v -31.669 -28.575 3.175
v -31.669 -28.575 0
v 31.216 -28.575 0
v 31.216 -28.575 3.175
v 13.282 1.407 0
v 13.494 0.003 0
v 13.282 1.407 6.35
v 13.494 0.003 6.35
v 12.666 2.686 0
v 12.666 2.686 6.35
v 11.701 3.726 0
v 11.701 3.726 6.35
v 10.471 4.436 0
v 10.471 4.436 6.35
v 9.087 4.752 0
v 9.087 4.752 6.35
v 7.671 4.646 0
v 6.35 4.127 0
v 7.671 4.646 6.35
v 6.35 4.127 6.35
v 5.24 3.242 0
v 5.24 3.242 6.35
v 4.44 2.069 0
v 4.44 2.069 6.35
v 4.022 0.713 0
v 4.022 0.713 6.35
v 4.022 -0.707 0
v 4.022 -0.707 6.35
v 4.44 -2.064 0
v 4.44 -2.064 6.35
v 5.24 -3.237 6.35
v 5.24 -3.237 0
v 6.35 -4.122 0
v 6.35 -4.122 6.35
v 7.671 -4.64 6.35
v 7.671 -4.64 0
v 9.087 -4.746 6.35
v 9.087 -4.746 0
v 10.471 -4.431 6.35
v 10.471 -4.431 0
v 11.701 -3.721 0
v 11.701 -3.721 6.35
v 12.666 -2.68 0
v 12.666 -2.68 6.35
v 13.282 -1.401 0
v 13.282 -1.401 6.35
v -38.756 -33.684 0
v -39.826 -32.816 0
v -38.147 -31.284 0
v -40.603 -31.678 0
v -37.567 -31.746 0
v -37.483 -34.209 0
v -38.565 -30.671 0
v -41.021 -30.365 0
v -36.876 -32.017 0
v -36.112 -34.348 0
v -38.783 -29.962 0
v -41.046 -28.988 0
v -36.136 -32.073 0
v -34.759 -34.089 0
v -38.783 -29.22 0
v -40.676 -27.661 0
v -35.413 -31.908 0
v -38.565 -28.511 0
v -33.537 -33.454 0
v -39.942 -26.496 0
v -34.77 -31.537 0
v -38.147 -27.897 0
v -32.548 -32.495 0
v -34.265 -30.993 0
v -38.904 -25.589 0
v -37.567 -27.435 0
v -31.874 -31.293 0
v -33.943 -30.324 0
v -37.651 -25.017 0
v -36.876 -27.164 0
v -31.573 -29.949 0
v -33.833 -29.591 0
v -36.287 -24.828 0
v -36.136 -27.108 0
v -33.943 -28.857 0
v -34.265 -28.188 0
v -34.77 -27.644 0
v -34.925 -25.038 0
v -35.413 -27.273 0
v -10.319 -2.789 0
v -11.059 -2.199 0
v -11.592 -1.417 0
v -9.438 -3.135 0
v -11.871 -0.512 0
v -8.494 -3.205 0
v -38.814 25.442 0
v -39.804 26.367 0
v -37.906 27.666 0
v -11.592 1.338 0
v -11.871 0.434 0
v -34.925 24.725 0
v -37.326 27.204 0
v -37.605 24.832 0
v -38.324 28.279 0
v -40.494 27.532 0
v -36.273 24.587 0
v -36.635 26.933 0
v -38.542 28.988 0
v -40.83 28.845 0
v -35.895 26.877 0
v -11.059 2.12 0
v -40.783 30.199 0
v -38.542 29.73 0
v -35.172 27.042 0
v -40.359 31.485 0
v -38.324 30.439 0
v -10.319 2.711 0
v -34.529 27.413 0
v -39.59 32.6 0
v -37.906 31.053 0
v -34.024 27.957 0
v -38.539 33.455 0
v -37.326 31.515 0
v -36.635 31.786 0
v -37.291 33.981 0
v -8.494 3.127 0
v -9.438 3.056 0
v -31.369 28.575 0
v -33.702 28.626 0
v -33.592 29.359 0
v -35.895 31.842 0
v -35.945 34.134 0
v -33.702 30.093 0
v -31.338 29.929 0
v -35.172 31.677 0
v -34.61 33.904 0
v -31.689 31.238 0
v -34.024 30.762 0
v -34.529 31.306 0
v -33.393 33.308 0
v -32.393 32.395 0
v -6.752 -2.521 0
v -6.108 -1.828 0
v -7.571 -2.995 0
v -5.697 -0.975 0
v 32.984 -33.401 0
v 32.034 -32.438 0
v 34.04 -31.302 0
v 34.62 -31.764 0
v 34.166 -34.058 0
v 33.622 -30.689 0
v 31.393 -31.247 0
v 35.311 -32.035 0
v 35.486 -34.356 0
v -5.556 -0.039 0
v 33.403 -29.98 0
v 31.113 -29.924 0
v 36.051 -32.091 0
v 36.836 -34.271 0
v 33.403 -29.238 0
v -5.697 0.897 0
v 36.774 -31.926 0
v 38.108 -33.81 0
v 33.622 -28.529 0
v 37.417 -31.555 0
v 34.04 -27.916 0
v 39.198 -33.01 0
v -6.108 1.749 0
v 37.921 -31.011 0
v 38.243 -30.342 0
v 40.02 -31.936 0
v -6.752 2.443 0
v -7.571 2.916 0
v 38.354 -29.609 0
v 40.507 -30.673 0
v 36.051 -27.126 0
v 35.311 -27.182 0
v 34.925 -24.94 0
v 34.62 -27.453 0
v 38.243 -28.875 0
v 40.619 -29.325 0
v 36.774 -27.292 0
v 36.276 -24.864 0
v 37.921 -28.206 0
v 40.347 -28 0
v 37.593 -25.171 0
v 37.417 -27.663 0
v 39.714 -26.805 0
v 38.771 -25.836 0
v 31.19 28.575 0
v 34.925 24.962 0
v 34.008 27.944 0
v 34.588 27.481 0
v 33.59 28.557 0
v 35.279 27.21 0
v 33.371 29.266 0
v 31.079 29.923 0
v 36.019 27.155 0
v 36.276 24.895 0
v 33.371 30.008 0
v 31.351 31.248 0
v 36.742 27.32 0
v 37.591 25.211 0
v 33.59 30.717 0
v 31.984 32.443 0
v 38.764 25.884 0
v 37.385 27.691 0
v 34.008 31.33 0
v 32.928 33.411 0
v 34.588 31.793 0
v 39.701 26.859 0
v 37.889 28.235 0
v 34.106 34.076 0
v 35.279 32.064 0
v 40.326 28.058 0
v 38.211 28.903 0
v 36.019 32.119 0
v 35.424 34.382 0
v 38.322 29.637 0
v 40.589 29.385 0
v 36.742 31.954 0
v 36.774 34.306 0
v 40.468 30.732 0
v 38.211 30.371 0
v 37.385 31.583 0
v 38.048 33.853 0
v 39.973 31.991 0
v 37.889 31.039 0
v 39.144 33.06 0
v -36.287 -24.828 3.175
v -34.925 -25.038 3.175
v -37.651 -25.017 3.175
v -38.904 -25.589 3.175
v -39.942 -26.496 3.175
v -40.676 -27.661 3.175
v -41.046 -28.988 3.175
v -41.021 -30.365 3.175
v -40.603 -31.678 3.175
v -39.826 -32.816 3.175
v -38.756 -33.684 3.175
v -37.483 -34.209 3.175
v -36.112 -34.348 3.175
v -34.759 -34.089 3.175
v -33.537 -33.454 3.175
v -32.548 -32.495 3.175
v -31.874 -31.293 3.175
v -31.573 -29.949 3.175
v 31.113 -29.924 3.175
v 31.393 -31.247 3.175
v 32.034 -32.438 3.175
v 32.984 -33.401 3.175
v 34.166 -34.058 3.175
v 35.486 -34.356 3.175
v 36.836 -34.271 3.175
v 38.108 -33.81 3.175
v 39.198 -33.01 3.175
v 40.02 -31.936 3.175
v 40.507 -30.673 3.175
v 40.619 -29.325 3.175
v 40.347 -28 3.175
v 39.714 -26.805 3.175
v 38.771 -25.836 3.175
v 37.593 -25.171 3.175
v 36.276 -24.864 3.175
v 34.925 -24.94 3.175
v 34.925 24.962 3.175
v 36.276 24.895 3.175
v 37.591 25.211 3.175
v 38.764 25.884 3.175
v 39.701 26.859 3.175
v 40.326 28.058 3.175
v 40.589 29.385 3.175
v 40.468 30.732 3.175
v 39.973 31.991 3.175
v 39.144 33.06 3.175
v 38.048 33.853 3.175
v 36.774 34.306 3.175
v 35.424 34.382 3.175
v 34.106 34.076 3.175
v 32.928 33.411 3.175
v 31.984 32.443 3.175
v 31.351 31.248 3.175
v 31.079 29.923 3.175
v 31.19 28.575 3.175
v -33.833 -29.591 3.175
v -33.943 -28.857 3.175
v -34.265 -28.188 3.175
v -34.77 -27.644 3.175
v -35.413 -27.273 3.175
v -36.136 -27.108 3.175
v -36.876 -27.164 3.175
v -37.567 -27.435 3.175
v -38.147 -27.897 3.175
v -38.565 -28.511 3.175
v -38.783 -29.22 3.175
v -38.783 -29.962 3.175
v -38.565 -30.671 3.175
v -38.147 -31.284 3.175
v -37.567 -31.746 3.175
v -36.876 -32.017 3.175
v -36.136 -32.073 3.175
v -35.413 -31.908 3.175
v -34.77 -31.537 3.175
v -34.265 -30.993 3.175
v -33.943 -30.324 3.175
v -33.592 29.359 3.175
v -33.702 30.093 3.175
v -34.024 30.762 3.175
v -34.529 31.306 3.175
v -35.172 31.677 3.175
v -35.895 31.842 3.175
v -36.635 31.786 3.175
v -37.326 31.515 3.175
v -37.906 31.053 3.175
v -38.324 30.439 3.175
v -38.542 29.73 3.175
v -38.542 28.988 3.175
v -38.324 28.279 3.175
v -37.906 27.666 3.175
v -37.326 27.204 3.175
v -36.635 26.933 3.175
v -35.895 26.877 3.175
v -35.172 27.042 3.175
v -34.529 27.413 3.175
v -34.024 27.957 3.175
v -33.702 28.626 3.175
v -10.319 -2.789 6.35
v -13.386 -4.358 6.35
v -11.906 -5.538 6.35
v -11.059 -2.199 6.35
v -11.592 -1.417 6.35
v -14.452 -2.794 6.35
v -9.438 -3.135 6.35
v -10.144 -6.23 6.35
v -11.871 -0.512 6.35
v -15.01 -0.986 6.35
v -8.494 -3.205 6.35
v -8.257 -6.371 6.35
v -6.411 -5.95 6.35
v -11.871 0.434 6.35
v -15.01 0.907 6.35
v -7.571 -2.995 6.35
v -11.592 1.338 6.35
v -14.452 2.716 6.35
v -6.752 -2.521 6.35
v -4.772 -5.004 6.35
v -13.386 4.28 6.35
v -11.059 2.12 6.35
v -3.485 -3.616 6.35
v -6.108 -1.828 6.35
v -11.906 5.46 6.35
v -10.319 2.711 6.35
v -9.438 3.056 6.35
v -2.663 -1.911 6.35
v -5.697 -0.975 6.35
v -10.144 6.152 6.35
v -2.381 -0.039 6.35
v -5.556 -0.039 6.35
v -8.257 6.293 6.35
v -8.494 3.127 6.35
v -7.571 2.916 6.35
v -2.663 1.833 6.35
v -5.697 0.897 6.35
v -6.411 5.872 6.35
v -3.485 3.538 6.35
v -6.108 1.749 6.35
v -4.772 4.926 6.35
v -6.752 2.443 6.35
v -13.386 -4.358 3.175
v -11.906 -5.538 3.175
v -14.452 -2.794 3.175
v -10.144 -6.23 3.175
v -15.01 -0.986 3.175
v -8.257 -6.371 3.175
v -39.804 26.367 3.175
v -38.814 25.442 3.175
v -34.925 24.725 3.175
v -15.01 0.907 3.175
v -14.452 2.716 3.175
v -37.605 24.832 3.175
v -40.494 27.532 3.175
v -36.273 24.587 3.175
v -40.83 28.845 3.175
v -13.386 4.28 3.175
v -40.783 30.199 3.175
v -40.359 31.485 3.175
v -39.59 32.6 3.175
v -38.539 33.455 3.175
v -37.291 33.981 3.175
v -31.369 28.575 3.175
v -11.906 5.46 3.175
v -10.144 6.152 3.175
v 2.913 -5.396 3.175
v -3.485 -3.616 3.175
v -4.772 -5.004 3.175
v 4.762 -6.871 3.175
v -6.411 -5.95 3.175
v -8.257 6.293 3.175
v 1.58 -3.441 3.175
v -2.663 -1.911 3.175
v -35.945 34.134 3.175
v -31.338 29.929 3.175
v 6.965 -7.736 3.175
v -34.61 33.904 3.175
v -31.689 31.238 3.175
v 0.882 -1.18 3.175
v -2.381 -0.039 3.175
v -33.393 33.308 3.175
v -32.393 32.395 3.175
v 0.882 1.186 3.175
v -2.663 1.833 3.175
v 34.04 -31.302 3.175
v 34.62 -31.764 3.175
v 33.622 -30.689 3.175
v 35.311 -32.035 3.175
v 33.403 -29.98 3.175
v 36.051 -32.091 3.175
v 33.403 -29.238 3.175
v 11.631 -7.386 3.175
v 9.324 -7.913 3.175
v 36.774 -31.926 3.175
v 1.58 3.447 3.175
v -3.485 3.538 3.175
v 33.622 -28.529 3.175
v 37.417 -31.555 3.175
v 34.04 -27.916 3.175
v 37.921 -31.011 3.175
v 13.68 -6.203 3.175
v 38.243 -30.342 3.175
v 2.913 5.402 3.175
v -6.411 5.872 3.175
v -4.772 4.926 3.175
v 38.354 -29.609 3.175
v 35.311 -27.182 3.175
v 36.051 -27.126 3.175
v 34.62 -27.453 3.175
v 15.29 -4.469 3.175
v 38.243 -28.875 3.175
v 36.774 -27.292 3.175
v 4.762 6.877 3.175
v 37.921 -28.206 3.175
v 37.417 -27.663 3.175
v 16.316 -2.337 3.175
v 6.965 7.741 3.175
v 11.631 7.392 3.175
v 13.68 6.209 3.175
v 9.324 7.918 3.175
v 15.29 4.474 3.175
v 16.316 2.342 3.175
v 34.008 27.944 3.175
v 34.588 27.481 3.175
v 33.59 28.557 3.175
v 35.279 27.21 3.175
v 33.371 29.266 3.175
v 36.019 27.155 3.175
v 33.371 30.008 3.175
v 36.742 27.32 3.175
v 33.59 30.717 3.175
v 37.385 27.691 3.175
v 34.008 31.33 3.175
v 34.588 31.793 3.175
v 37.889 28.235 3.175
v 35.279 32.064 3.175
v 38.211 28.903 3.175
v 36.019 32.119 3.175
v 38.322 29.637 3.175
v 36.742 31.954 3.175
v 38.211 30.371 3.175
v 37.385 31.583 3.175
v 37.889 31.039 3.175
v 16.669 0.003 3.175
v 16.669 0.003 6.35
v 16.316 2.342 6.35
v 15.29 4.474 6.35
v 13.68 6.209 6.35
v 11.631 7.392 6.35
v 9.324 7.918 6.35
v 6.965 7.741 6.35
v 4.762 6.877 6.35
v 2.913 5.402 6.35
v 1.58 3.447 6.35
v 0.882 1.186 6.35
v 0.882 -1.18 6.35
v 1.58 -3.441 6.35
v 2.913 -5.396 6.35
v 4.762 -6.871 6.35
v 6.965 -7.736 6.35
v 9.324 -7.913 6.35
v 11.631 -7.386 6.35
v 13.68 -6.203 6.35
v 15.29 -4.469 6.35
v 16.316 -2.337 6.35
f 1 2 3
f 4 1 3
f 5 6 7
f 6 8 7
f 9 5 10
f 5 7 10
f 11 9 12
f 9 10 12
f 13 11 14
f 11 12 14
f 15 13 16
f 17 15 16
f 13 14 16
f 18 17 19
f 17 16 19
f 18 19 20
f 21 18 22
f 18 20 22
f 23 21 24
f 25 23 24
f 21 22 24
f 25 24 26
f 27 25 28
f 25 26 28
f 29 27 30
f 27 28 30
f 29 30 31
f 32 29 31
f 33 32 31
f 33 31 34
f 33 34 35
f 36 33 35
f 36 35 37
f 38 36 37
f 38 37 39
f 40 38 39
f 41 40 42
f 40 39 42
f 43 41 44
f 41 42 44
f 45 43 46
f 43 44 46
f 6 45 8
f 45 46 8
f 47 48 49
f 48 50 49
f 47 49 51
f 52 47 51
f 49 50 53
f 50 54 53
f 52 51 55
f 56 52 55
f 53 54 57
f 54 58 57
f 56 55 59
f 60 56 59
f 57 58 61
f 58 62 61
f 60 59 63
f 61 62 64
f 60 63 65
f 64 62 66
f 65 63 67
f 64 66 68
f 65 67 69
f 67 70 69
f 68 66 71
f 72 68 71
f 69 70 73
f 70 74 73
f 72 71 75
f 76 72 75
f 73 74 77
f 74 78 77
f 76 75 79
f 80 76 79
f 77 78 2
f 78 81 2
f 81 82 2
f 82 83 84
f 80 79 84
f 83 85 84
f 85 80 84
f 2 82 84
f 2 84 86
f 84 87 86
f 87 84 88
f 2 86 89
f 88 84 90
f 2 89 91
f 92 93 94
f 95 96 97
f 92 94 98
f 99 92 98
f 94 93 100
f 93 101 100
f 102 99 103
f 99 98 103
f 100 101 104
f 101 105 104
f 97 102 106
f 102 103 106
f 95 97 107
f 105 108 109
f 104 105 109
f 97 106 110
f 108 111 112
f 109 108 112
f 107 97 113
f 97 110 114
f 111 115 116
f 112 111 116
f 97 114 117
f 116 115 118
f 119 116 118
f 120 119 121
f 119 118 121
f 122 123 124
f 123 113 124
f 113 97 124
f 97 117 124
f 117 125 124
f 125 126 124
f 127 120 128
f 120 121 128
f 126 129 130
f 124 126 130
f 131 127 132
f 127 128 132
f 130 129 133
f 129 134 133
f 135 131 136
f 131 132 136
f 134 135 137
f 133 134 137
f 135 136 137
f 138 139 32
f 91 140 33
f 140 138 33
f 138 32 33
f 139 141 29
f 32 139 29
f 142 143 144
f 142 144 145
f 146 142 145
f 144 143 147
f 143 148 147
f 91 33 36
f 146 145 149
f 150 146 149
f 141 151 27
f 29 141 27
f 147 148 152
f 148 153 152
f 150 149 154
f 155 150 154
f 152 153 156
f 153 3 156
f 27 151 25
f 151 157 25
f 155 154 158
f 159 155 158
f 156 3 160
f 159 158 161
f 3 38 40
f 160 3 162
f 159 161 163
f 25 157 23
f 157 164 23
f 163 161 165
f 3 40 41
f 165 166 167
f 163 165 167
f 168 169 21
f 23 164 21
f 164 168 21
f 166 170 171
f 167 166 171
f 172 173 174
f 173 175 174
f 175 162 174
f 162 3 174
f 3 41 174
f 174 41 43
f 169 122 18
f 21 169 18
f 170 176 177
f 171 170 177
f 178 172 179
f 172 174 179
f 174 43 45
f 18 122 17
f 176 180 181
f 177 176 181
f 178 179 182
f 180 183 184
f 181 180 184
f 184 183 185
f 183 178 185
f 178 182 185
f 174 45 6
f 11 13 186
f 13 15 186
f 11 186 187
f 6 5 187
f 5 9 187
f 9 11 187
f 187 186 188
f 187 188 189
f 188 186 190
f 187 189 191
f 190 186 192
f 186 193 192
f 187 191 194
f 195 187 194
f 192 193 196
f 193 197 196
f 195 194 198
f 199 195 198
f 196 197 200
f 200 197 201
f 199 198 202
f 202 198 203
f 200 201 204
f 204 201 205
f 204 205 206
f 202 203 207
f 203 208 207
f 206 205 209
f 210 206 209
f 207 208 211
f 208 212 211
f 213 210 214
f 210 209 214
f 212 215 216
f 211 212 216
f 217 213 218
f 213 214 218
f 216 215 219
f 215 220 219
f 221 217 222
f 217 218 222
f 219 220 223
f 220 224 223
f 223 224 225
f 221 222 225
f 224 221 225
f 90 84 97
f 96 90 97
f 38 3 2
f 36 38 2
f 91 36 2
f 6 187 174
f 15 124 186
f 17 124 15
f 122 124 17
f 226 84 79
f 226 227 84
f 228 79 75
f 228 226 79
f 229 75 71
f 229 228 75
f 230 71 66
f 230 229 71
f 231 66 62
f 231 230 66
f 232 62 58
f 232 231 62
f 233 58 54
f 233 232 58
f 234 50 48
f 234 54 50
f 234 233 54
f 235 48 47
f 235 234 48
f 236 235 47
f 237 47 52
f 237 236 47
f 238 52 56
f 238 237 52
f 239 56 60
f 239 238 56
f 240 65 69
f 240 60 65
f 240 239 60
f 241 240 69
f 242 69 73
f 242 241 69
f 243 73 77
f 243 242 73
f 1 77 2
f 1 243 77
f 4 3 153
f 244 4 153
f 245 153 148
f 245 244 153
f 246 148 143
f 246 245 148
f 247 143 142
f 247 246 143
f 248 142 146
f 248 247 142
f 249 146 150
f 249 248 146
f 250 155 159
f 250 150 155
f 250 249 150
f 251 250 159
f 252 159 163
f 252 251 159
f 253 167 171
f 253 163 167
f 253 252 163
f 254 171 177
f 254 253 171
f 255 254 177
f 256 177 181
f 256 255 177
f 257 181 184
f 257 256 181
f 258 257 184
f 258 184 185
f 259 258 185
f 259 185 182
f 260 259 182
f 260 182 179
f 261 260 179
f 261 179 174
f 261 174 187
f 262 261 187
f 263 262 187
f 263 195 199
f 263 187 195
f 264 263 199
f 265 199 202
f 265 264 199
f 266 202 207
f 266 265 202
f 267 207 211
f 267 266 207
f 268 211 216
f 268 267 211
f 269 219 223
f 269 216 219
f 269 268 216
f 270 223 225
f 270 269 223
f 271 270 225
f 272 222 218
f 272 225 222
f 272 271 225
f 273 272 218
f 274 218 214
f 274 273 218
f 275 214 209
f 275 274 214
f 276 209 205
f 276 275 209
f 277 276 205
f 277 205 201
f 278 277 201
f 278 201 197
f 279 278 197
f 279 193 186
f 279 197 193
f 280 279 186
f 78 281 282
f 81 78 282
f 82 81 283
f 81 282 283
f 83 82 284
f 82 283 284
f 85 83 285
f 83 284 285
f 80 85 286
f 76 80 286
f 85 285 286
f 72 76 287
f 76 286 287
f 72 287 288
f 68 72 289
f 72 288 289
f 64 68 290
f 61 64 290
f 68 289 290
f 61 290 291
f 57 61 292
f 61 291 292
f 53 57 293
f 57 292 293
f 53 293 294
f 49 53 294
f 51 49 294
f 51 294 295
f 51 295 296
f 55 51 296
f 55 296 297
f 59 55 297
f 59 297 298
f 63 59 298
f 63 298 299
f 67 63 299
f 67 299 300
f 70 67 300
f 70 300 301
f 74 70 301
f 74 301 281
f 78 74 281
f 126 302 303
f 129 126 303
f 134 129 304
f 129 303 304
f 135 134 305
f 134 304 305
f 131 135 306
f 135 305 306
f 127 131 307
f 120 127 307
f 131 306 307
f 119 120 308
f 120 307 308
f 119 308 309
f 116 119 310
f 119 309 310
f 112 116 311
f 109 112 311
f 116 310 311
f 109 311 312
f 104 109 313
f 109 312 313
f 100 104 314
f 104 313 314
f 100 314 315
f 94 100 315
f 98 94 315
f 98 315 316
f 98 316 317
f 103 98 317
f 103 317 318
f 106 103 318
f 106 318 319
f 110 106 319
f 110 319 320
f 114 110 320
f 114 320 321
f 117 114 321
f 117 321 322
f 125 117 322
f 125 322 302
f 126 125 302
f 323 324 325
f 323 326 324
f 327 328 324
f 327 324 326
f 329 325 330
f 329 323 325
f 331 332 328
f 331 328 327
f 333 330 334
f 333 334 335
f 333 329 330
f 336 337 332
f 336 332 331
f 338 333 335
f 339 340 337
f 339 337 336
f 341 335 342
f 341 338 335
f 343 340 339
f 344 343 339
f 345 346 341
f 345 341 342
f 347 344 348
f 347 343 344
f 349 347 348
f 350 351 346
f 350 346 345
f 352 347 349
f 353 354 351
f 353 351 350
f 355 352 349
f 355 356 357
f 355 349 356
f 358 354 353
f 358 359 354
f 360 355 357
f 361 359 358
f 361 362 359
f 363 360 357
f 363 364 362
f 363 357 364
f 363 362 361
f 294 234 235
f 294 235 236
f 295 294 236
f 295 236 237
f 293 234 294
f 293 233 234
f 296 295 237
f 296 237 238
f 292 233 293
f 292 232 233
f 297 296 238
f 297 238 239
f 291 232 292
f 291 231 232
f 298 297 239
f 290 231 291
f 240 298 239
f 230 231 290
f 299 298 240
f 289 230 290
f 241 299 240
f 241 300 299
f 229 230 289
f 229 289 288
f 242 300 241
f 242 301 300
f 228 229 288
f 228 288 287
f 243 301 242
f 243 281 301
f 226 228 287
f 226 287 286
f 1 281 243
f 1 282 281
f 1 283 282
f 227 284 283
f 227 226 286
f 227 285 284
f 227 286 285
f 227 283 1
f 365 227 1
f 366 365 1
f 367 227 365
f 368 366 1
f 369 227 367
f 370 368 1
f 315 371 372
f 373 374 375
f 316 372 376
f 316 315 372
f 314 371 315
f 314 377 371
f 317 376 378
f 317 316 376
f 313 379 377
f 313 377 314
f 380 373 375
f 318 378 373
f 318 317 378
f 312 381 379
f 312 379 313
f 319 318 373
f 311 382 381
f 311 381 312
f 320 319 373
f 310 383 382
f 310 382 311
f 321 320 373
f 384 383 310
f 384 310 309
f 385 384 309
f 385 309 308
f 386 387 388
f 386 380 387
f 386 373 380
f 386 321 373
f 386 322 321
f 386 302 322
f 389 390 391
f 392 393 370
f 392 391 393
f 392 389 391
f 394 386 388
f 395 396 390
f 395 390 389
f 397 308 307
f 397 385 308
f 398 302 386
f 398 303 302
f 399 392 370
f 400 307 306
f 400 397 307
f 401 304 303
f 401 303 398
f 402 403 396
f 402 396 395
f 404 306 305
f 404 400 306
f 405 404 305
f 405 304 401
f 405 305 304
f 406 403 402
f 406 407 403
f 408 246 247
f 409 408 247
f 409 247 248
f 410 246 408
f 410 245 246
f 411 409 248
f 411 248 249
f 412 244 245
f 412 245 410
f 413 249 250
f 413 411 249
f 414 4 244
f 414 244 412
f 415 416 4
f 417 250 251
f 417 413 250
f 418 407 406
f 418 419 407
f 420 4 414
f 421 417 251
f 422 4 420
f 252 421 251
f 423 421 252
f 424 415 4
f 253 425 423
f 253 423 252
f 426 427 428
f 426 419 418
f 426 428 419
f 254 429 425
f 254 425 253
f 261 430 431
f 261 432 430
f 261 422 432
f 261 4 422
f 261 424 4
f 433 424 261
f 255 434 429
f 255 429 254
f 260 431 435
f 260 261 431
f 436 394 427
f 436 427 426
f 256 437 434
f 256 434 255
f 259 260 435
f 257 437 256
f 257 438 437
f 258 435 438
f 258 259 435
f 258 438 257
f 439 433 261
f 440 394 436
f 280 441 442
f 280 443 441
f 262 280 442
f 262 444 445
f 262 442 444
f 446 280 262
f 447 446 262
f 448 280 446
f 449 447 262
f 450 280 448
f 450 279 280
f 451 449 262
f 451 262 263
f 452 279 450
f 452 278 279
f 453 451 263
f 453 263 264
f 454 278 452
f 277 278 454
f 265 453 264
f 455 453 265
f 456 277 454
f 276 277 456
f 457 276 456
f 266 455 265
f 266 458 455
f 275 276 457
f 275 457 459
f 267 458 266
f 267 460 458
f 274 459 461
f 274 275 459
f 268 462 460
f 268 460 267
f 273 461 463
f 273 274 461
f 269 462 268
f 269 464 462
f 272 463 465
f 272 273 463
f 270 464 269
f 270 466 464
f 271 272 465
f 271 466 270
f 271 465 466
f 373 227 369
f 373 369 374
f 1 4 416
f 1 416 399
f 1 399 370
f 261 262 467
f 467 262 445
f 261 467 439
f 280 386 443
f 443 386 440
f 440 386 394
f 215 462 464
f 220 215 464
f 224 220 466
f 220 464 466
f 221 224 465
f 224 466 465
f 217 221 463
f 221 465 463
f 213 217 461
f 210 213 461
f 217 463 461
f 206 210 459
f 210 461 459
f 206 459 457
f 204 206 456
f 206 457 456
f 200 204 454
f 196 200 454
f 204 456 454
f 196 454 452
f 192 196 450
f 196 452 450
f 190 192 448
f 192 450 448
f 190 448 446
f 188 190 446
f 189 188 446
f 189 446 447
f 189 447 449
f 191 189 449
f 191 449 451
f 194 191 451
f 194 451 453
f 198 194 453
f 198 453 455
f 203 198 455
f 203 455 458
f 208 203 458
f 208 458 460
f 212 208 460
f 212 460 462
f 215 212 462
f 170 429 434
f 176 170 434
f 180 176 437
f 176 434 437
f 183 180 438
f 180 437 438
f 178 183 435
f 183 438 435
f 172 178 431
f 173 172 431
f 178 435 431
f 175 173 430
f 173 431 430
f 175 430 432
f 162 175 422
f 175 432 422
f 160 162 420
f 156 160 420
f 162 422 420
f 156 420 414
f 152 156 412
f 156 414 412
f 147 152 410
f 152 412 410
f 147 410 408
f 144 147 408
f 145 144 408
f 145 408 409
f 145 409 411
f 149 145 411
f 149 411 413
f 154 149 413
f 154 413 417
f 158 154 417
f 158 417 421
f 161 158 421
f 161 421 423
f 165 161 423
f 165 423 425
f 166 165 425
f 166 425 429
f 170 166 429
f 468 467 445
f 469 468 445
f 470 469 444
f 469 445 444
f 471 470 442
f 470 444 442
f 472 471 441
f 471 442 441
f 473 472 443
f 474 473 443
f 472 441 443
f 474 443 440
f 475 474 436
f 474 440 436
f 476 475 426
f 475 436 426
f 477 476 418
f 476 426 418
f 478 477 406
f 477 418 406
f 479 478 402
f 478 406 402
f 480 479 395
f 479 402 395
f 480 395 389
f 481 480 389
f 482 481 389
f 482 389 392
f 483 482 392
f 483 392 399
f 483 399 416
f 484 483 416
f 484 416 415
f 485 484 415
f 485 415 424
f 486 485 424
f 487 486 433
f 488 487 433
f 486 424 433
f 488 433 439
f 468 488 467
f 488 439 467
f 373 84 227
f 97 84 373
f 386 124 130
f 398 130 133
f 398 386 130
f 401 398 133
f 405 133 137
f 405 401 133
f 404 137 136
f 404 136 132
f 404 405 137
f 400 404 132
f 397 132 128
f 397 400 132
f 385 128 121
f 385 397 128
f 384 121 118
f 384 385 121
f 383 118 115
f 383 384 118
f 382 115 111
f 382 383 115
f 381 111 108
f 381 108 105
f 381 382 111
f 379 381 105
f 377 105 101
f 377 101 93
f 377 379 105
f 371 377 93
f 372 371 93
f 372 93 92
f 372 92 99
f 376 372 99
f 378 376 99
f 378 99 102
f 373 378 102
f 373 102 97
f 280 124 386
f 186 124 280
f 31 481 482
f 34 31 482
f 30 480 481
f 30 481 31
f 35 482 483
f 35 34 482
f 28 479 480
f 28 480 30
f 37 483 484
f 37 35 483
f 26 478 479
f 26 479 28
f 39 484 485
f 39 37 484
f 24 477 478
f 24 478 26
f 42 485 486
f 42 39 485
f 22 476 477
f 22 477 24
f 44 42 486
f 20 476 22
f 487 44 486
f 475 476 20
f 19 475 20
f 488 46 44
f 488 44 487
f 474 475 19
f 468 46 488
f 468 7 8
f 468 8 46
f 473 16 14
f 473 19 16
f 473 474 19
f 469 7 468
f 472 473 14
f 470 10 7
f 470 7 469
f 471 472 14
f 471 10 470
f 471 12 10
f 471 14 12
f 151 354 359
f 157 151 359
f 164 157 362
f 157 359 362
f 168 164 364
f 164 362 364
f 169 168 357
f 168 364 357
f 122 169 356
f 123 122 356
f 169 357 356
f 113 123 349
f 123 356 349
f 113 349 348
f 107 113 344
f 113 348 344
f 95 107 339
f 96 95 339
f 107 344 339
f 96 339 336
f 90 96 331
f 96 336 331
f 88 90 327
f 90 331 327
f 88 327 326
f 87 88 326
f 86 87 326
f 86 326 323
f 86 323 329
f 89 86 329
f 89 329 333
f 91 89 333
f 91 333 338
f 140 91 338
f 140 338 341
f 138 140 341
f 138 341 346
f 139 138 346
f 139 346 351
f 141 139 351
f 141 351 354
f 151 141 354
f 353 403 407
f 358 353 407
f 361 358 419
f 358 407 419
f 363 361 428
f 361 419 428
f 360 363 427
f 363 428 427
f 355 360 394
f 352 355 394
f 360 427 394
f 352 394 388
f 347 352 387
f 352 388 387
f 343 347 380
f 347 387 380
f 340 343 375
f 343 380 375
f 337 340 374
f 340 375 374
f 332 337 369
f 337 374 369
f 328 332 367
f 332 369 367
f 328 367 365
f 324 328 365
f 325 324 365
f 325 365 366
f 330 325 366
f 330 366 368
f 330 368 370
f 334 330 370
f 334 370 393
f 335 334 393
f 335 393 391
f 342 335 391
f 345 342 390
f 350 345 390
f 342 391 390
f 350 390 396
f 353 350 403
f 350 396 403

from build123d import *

# Parameters (mm, degrees)
SKETCH1_W           = 69.85
SKETCH1_H           = 57.15
BOSS_EXTRUDE1_DEPTH = 3.175
SKETCH2_R           = 4.776740808
SKETCH2_R_2         = 4.7625
BOSS_EXTRUDE2_DEPTH = 3.175
SKETCH3_R           = 2.4892
CUT_EXTRUDE1_DEPTH  = 54.678109207
SKETCH4_R           = 3.175
SKETCH4_R_2         = 4.7625
CUT_EXTRUDE2_DEPTH  = 54.678109207
SKETCH5_R           = 6.35
SKETCH5_R_2         = 7.9375
BOSS_EXTRUDE3_DEPTH = 3.175
SKETCH6_R           = 4.7625
SKETCH6_R_2         = 3.175
CUT_EXTRUDE3_DEPTH  = 54.959070443


with BuildPart() as part:
    # Sketch1 → Boss-Extrude1 (new body)
    with BuildSketch(Plane.XY):
        Rectangle(SKETCH1_W, SKETCH1_H)
    extrude(amount=BOSS_EXTRUDE1_DEPTH)

    # Sketch2 → Boss-Extrude2 (add)
    with BuildSketch(Plane.XY.offset(3.175)):
        with Locations((-36.080944449, 29.359475258)):
            Circle(SKETCH2_R)
        with Locations((35.832665303, 29.636957013)):
            Circle(SKETCH2_R_2)
        with Locations((35.864779118, -29.608646076)):
            Circle(SKETCH2_R_2)
        with Locations((-36.322, -29.590559194)):
            Circle(SKETCH2_R_2)
    extrude(amount=-BOSS_EXTRUDE2_DEPTH)

    # Sketch3 → Cut-Extrude1 (cut, through all)
    with BuildSketch(Plane.XY.offset(3.175)):
        with Locations((-36.080944449, 29.359475258)):
            Circle(SKETCH3_R)
        with Locations((35.832665303, 29.636957013)):
            Circle(SKETCH3_R)
        with Locations((35.864779118, -29.608646076)):
            Circle(SKETCH3_R)
        with Locations((-36.322, -29.590559194)):
            Circle(SKETCH3_R)
    extrude(amount=-CUT_EXTRUDE1_DEPTH, mode=Mode.SUBTRACT)

    # Sketch4 → Cut-Extrude2 (cut, through all)
    with BuildSketch(Plane.XY.offset(3.175)):
        with Locations((-8.73125, -0.039106259)):
            Circle(SKETCH4_R)
        with Locations((8.73125, 0.002745202)):
            Circle(SKETCH4_R_2)
    extrude(amount=-CUT_EXTRUDE2_DEPTH, mode=Mode.SUBTRACT)

    # Sketch5 → Boss-Extrude3 (add)
    with BuildSketch(Plane.XY.offset(3.175)):
        with Locations((-8.73125, -0.039106259)):
            Circle(SKETCH5_R)
        with Locations((8.73125, 0.002745202)):
            Circle(SKETCH5_R_2)
    extrude(amount=BOSS_EXTRUDE3_DEPTH)

    # Sketch6 → Cut-Extrude3 (cut, through all)
    with BuildSketch(Plane.XY.offset(6.35)):
        with Locations((8.73125, 0.002745202)):
            Circle(SKETCH6_R)
        with Locations((-8.73125, -0.039106259)):
            Circle(SKETCH6_R_2)
    extrude(amount=-CUT_EXTRUDE3_DEPTH, mode=Mode.SUBTRACT)


solid = part.part
